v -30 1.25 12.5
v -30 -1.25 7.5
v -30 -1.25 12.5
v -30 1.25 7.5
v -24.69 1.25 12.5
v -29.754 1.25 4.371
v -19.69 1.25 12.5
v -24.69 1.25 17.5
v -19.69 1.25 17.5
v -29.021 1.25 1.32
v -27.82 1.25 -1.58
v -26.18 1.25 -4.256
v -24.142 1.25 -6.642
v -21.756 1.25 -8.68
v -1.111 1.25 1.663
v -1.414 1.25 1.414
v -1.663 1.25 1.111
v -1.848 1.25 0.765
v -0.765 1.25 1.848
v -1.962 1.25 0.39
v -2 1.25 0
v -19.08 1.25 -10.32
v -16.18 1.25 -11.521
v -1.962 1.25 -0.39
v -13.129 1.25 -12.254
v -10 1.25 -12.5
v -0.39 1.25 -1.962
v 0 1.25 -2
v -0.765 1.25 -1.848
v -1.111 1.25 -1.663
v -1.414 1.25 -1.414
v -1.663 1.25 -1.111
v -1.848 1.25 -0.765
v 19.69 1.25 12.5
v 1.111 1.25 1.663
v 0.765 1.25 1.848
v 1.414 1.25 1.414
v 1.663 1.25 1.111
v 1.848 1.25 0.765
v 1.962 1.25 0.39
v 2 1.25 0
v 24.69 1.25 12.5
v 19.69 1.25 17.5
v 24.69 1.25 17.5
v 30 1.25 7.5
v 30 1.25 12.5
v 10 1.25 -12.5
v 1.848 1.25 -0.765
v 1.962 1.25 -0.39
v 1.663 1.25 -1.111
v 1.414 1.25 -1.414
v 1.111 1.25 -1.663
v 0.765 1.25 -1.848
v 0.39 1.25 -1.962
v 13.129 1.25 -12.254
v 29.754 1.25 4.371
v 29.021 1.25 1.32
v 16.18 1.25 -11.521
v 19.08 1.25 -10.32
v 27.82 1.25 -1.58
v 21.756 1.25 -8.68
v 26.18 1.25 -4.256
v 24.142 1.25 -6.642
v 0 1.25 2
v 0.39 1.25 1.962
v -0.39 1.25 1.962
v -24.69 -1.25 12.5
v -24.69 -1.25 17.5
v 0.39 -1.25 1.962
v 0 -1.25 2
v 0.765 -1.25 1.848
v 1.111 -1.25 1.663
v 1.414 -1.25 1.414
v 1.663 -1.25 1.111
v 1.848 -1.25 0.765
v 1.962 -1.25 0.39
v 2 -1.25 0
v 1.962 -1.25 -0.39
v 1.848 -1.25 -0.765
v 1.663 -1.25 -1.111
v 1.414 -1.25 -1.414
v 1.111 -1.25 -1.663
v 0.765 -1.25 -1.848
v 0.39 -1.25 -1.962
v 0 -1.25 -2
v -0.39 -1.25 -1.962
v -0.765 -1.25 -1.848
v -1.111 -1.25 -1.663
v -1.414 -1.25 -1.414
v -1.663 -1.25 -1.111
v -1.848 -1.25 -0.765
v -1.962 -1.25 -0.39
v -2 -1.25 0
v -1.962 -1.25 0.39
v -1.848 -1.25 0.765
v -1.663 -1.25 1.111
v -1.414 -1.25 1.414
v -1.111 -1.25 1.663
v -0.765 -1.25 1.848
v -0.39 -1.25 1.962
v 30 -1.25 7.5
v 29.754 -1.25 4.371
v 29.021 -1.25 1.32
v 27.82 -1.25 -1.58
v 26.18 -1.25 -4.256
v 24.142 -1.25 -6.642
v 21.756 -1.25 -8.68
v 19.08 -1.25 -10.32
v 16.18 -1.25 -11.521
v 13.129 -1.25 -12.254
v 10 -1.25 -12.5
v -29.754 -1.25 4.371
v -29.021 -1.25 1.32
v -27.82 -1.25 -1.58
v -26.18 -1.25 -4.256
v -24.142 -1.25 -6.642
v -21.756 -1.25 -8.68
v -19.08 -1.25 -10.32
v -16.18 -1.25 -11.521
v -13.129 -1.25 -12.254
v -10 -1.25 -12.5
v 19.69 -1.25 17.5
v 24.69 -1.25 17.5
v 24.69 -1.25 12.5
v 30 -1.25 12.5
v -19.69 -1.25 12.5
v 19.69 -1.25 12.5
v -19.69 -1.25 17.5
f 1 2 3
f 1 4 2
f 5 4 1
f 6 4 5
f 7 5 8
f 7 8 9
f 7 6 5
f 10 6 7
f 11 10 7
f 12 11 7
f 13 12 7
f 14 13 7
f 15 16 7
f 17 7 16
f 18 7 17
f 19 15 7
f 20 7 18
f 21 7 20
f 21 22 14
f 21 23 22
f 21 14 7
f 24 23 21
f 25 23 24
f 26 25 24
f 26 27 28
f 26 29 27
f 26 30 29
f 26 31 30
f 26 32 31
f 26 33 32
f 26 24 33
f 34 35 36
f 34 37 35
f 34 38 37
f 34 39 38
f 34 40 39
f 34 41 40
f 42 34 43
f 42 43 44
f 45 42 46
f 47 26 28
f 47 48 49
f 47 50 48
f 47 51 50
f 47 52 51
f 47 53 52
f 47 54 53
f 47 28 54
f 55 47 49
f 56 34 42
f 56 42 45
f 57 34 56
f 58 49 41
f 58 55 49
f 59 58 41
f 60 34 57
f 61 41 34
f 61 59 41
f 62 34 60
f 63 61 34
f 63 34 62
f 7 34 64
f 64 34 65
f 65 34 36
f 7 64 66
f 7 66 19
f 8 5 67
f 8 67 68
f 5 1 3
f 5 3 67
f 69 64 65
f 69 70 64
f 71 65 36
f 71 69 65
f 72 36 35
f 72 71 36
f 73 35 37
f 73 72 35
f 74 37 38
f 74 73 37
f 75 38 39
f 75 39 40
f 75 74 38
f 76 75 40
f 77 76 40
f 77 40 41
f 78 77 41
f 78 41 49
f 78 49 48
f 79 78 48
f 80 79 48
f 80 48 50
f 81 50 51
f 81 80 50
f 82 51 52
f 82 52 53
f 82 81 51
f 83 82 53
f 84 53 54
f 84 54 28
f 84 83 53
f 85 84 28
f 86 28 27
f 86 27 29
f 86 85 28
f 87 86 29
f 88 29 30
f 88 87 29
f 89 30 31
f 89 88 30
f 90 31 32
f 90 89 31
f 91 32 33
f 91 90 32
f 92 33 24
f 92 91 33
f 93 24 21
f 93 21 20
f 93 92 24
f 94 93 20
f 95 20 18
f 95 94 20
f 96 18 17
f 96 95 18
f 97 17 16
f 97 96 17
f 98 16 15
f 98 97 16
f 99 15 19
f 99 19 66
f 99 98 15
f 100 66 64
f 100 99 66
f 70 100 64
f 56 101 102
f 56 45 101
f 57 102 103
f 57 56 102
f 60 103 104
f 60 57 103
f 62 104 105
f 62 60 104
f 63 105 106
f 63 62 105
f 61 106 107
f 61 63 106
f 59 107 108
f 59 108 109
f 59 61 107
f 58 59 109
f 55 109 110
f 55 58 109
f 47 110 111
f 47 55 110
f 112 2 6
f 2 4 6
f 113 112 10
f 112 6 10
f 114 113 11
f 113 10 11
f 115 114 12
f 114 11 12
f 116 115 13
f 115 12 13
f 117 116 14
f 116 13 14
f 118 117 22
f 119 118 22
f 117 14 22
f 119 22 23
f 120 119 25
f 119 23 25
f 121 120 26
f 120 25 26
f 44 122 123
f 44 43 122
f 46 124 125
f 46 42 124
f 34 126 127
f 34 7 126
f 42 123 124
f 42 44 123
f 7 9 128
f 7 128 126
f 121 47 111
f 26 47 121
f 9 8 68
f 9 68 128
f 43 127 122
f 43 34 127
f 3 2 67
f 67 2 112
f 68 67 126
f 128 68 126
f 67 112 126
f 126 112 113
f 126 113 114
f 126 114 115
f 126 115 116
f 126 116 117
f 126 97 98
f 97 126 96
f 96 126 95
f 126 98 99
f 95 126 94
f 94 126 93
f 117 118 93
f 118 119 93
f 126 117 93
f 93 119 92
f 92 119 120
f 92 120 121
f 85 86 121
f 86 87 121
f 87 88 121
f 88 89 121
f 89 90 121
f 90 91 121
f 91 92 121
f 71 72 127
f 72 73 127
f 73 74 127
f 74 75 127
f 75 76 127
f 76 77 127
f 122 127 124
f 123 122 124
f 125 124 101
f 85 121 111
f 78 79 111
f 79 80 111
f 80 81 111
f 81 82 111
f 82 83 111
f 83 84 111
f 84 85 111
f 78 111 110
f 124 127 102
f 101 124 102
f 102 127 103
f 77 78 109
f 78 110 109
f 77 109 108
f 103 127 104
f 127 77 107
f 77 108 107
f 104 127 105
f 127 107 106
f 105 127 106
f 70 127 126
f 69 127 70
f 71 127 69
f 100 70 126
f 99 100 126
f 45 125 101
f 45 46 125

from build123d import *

# Parameters (mm, degrees)
SKETCH1_R           = 2
BOSS_EXTRUDE1_DEPTH = 1.25
FILLET1_R           = 20


with BuildPart() as part:
    # Sketch1 → Boss-Extrude1 (new, symmetric)
    with BuildSketch(Plane(origin=(0, 0, 0), x_dir=(1, 0, 0), z_dir=(0, 1, 0))):
        Polygon((30, -12.5), (30, 12.5), (-30, 12.5), (-30, -12.5), (-24.69, -12.5), (-24.69, -17.5), (-19.69, -17.5), (-19.69, -12.5), (19.69, -12.5), (19.69, -17.5), (24.69, -17.5), (24.69, -12.5), align=None)
        with Locations(Location((0, 0, 0), (0, 0, 270))):
            Circle(SKETCH1_R, mode=Mode.SUBTRACT)
    extrude(amount=BOSS_EXTRUDE1_DEPTH, both=True)

    # Fillet1
    fillet1_edges = [part.edges().sort_by_distance(p)[0] for p in [
        (-30, 0, -12.5),
        (30, 0, -12.5),
    ]]
    fillet(fillet1_edges, radius=FILLET1_R)


solid = part.part
